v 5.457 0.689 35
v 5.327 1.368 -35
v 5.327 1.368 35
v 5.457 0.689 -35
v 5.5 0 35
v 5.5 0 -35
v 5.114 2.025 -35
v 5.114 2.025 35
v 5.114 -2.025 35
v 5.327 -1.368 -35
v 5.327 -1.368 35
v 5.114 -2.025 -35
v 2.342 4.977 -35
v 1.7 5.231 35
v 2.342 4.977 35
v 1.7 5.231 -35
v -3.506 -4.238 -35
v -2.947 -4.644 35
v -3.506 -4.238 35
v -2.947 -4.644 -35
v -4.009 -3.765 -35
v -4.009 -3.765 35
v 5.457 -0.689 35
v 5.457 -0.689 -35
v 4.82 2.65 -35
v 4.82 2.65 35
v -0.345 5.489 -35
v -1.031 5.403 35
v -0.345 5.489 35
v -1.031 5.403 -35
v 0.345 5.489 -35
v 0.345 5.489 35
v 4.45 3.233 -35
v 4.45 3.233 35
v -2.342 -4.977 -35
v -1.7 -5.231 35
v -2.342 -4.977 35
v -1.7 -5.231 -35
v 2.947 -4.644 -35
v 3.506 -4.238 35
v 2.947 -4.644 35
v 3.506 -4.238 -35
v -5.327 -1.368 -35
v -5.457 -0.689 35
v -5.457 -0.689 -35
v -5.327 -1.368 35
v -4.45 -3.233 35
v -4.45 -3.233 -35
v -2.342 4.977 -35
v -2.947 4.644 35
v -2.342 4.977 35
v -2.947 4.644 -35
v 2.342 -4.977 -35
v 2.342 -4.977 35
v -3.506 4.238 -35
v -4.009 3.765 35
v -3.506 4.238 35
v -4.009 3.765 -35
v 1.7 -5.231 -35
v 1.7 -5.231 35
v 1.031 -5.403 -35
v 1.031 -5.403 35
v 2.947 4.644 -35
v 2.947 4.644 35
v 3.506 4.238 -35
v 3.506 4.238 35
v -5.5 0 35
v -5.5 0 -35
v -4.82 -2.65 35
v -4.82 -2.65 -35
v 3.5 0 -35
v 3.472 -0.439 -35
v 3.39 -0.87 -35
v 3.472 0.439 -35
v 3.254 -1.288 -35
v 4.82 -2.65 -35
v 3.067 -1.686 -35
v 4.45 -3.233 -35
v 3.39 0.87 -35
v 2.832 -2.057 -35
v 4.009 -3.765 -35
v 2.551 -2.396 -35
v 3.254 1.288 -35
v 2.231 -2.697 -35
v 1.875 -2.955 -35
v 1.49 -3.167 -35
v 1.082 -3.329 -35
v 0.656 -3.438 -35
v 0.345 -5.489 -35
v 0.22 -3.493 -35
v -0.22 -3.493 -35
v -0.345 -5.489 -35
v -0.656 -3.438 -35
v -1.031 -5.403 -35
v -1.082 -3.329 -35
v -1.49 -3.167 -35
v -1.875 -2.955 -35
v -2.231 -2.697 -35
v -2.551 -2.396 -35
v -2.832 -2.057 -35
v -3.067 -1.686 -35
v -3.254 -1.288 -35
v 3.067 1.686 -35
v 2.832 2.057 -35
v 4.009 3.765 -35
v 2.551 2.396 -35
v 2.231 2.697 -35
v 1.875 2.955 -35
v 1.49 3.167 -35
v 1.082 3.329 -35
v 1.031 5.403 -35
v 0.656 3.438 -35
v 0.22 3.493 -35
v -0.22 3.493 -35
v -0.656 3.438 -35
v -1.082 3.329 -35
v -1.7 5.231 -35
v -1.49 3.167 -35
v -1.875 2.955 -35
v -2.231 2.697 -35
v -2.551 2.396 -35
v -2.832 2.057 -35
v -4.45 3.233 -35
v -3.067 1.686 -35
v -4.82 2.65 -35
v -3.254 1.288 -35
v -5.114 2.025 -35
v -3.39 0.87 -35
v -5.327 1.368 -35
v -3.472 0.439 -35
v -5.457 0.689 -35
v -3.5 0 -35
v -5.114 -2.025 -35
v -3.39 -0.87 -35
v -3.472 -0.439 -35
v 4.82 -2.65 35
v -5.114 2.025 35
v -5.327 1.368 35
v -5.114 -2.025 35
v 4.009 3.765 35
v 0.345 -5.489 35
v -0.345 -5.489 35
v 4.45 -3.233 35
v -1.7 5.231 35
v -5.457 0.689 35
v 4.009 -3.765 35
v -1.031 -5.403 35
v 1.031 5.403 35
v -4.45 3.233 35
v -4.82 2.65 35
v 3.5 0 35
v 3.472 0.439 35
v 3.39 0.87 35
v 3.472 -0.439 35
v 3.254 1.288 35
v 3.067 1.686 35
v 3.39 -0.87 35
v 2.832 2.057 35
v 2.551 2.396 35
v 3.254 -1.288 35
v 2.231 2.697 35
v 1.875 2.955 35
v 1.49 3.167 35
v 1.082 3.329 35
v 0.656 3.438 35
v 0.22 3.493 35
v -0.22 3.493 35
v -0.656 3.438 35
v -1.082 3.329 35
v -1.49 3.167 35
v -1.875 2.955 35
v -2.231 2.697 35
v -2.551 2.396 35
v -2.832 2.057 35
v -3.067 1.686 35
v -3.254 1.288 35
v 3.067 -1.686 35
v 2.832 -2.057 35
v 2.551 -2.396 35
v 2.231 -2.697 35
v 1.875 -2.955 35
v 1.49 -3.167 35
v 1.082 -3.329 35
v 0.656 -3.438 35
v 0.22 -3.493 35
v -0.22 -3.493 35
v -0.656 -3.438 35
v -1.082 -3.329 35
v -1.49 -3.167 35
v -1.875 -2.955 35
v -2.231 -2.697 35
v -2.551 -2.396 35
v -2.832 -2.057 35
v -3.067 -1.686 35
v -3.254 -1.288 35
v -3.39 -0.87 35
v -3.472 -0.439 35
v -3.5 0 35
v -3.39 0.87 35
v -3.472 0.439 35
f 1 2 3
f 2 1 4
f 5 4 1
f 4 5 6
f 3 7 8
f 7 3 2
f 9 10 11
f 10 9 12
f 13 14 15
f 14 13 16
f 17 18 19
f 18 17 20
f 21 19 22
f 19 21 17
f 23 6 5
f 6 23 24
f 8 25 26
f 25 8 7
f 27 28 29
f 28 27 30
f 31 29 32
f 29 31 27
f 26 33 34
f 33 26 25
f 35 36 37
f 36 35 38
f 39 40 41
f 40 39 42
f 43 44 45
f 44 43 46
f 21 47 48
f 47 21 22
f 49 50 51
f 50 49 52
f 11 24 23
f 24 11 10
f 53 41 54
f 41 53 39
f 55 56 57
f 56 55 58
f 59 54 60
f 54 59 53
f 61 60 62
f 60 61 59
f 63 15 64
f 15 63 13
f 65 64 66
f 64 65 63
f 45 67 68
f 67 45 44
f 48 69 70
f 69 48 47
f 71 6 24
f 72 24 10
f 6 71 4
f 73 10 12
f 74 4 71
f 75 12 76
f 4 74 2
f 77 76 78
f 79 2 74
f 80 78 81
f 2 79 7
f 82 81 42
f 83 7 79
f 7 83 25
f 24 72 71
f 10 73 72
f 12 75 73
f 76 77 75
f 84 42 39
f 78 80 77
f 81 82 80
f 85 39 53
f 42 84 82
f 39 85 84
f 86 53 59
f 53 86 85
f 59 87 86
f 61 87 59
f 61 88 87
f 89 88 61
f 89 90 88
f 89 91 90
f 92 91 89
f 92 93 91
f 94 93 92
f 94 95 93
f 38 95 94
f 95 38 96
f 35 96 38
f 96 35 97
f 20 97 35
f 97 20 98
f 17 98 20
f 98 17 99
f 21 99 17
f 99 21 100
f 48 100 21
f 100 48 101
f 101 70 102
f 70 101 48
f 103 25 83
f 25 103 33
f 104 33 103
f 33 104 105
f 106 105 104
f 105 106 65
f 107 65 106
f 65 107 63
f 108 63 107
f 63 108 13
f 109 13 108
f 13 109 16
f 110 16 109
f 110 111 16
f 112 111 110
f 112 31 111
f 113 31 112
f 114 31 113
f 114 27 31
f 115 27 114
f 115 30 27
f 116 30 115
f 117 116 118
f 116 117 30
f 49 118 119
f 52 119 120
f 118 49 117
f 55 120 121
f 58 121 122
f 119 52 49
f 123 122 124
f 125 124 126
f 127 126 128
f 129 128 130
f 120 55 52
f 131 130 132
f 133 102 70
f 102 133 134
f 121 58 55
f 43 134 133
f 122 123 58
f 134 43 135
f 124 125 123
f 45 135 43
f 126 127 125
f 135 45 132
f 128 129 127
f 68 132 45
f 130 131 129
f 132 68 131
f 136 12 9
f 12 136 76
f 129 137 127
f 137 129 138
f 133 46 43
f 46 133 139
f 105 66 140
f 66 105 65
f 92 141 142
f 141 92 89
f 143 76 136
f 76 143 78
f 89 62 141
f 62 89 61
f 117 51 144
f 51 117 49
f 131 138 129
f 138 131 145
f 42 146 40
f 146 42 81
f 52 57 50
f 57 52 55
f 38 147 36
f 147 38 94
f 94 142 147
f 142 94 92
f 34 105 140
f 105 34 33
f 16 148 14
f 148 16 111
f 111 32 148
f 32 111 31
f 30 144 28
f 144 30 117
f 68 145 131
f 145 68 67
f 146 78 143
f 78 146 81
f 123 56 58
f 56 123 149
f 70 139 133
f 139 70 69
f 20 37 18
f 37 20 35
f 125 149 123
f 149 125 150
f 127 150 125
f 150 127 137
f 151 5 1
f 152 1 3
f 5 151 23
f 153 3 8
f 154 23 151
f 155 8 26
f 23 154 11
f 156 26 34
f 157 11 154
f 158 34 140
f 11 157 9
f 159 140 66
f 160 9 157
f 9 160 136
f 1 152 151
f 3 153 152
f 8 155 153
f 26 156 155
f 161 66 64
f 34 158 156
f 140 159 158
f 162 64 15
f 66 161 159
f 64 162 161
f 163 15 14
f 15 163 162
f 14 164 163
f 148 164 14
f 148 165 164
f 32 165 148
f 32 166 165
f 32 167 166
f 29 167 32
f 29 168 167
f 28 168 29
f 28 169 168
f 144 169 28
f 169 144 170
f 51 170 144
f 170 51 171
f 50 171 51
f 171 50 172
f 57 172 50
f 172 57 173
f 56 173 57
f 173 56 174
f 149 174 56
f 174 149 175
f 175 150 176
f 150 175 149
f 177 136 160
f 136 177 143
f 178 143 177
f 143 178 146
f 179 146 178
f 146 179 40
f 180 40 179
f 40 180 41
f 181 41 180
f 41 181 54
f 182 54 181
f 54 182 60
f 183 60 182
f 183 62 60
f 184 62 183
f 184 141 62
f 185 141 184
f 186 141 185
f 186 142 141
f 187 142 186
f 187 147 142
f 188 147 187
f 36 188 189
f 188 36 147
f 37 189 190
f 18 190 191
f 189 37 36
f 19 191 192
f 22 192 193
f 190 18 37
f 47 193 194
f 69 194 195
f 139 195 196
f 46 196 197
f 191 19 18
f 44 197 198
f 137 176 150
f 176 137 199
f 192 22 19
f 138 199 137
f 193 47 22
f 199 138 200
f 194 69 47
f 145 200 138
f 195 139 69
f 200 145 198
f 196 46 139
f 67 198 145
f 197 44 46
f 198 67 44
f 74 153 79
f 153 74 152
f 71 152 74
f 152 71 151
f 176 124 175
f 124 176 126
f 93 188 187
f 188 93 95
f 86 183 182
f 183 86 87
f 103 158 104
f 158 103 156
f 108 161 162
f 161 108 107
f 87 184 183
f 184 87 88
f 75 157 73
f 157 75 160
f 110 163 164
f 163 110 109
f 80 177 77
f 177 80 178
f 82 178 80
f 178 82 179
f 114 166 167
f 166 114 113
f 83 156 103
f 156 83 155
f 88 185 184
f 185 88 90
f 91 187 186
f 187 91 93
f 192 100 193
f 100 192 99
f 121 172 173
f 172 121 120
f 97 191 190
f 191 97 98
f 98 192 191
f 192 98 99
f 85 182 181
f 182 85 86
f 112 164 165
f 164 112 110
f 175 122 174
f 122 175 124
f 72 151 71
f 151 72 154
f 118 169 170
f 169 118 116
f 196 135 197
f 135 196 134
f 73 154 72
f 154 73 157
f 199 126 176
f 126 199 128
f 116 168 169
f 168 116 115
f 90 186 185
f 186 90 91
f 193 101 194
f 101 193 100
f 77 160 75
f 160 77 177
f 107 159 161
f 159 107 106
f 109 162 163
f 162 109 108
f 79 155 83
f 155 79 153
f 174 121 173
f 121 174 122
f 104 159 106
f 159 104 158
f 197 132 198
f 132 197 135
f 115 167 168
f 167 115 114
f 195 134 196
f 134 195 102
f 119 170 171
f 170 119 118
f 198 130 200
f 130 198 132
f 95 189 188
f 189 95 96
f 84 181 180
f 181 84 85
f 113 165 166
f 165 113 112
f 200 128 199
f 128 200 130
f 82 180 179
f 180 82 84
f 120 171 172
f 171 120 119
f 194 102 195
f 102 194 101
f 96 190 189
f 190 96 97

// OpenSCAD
$fn = 50;


difference() {
	union() {
		translate(v = [0, 0, -35.0000000000]) {
			cylinder(h = 70, r = 5.5000000000);
		}
	}
	union() {
		translate(v = [0, 0, -100.0000000000]) {
			cylinder(h = 200, r = 3.5000000000);
		}
	}
}
